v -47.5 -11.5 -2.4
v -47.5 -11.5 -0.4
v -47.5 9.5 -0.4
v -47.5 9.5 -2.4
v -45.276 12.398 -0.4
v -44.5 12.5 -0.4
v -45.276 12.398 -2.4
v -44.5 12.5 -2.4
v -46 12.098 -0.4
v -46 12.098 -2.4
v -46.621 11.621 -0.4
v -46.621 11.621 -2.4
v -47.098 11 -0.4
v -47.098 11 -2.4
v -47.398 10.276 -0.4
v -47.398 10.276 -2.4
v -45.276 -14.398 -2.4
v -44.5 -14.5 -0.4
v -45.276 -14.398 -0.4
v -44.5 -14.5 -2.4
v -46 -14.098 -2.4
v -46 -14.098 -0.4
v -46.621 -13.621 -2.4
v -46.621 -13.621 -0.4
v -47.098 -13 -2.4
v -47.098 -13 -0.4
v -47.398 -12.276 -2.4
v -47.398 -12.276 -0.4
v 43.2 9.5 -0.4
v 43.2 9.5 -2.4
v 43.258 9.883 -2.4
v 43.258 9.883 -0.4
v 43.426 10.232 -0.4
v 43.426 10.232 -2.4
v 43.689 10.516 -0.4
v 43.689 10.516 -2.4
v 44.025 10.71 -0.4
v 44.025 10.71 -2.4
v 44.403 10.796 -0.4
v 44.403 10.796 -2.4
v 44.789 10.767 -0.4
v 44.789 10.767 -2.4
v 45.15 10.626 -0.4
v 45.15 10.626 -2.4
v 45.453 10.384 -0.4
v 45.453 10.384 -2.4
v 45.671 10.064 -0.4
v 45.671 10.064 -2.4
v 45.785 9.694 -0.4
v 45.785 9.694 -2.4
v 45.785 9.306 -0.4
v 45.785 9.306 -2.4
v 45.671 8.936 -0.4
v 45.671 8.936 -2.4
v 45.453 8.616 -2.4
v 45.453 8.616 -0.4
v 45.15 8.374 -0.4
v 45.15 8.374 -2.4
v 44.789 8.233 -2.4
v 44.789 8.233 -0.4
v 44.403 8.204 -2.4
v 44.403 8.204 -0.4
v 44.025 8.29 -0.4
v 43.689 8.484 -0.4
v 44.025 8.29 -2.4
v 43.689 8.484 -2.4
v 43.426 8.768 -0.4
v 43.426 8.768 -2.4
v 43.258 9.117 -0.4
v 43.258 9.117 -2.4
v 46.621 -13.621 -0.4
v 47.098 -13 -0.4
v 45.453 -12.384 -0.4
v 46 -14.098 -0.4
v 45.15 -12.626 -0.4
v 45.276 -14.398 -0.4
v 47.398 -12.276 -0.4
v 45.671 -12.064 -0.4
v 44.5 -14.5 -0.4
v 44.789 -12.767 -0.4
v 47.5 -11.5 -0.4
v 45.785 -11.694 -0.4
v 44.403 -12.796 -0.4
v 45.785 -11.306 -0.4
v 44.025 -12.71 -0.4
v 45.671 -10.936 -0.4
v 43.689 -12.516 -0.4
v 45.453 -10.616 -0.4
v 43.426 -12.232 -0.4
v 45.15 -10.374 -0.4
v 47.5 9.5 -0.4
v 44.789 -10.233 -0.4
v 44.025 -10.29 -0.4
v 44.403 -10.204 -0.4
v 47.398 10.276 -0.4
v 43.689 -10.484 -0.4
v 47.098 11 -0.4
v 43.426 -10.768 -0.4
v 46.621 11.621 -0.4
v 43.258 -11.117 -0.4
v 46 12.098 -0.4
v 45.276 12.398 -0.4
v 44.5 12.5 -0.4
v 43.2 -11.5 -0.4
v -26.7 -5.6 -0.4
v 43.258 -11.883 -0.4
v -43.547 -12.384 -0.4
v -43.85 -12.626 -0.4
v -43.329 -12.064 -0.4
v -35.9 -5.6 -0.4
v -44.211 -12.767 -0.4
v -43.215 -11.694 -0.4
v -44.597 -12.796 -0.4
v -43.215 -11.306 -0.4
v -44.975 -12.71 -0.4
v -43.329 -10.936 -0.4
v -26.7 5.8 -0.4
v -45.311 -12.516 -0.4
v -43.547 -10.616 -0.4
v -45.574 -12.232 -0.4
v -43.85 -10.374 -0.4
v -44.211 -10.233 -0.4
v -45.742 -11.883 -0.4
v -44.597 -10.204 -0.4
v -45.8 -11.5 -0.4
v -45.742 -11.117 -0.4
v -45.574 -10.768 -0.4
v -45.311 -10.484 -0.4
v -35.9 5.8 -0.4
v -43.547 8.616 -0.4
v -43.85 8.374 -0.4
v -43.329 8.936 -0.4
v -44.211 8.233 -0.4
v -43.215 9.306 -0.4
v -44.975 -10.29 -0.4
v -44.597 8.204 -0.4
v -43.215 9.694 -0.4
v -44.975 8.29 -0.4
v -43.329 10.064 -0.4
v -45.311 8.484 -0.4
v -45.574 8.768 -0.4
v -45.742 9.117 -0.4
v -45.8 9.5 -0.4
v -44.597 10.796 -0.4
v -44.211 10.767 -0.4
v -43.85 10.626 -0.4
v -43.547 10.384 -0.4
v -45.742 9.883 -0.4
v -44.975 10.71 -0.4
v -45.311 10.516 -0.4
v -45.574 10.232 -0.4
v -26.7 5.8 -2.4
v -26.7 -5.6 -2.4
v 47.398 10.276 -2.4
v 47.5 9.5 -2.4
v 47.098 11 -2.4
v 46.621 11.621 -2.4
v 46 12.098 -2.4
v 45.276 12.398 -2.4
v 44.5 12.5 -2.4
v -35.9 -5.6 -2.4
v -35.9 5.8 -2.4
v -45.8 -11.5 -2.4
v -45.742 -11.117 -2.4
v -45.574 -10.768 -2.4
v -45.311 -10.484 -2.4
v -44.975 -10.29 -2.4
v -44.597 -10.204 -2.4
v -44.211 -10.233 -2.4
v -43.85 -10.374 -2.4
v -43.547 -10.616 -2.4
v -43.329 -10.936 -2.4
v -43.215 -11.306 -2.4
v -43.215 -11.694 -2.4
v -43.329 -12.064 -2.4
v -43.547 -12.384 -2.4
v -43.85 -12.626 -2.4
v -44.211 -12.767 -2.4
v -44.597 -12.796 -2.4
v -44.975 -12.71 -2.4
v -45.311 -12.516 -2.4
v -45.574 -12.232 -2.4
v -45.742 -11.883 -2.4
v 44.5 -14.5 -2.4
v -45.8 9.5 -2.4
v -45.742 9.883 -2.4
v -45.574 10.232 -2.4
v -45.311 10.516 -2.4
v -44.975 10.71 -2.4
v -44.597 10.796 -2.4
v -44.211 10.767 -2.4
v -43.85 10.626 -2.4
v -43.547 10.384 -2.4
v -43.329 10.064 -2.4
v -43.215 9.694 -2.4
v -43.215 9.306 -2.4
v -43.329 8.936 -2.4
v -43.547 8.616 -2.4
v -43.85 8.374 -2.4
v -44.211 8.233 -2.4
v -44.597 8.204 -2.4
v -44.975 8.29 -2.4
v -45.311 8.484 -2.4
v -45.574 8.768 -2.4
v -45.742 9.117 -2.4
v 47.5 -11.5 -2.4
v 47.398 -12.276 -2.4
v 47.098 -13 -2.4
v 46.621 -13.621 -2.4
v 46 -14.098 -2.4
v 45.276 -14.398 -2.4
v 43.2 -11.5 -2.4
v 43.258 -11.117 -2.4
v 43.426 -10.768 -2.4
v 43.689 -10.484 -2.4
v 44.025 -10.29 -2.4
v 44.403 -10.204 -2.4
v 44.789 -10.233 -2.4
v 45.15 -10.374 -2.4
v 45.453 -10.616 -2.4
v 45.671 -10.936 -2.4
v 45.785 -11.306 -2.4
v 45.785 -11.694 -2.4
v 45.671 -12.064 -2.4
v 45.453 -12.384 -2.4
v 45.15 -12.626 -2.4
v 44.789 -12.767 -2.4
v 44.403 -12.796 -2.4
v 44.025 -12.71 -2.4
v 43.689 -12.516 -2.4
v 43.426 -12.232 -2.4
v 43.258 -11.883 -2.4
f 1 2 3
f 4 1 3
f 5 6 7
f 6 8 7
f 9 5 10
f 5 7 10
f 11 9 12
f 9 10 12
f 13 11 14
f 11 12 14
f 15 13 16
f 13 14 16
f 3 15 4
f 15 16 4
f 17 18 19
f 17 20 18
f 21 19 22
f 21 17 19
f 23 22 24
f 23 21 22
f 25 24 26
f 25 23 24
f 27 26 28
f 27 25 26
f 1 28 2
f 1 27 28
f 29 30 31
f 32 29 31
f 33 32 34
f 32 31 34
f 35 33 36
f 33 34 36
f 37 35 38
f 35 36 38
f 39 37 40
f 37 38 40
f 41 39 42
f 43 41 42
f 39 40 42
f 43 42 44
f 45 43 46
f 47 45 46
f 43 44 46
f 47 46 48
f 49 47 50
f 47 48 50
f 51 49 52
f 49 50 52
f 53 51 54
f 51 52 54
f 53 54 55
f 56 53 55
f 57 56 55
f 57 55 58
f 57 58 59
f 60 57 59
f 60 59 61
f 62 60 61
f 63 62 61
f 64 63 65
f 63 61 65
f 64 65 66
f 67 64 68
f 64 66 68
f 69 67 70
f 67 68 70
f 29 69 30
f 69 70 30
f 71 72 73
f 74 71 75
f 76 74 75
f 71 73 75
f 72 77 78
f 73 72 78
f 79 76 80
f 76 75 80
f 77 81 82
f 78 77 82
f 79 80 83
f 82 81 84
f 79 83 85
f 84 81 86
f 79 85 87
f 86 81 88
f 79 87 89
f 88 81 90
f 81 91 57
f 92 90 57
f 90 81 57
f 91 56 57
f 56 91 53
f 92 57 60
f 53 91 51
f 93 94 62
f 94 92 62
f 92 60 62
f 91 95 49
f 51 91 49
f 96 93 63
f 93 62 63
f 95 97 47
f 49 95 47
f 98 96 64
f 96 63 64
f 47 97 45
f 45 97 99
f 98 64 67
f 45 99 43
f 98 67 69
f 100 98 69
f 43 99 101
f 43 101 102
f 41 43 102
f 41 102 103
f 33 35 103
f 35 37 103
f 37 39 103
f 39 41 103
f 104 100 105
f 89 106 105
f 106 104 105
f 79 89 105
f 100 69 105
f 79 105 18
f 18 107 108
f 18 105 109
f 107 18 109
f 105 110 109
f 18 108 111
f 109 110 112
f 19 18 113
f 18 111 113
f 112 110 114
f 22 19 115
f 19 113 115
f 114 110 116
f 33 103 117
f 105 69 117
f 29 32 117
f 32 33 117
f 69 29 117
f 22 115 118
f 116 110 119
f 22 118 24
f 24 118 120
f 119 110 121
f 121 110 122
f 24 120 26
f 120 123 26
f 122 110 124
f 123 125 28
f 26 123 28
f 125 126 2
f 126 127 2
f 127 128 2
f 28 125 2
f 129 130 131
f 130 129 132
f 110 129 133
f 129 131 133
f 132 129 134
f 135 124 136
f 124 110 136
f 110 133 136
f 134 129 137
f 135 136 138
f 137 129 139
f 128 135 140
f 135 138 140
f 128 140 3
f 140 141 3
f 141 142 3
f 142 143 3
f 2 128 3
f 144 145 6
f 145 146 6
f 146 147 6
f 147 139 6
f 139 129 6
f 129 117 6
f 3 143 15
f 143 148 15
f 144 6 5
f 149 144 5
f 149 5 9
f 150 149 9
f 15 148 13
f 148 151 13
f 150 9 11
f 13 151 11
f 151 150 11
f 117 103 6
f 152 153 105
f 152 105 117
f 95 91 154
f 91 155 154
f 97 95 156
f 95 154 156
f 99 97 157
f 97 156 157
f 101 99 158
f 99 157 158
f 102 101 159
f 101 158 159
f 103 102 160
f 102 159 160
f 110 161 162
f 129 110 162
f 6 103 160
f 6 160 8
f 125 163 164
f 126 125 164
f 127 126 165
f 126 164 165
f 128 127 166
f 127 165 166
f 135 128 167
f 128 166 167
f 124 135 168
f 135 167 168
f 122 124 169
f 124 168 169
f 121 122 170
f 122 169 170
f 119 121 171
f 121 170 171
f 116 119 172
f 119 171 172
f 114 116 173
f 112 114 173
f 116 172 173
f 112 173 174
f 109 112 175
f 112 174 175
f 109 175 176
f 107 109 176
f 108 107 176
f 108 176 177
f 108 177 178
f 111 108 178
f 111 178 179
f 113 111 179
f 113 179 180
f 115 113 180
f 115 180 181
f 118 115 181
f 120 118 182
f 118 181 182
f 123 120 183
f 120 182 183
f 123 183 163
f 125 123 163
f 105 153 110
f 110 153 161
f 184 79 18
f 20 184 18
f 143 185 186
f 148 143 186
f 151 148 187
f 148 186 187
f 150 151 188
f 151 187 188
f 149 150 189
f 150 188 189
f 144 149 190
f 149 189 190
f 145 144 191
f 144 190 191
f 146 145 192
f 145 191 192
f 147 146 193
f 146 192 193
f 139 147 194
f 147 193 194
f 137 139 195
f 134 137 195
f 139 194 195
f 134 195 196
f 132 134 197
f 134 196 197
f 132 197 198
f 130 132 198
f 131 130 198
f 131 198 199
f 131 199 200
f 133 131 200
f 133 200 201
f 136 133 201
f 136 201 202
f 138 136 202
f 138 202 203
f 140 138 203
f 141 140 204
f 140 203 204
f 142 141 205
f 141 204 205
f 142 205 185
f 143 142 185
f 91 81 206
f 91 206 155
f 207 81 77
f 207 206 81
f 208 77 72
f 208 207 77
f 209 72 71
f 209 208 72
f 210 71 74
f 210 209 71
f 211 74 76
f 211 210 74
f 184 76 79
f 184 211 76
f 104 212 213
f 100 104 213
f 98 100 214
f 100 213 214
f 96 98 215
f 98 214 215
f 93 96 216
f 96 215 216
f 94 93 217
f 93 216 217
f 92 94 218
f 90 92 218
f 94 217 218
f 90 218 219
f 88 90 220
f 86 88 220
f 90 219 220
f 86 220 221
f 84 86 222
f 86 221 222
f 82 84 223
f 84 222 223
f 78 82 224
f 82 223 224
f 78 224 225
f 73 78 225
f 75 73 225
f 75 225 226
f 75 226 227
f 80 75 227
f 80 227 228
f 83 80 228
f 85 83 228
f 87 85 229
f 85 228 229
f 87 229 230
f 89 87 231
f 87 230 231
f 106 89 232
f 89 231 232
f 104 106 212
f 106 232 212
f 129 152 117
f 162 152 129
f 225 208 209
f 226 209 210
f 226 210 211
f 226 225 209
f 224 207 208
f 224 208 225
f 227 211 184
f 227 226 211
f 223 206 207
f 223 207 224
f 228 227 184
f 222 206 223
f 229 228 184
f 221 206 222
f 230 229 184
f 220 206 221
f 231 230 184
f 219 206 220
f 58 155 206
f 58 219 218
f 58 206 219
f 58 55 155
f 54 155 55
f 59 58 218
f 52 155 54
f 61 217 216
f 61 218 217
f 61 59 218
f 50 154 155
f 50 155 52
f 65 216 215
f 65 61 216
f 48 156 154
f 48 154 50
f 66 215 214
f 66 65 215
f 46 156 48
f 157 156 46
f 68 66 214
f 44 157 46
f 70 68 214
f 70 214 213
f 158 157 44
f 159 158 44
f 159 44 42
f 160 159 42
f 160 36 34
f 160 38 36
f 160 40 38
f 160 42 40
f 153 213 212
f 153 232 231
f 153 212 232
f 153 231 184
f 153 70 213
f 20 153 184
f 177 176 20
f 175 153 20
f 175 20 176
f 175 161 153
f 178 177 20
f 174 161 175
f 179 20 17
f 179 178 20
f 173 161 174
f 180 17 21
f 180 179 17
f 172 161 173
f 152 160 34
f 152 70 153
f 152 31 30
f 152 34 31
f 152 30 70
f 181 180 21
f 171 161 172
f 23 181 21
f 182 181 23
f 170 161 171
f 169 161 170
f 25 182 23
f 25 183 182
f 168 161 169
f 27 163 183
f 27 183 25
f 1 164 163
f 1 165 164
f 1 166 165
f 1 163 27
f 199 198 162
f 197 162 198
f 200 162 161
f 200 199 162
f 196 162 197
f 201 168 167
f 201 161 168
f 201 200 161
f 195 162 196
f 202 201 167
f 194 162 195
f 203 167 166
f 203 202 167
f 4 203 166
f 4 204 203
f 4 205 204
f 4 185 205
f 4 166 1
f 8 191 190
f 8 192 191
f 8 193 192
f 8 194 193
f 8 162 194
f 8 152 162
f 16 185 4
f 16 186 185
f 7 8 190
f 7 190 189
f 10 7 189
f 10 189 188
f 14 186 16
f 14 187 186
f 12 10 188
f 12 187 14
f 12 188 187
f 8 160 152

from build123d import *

# Parameters (mm, degrees)
SKETCH003_W             = 95
SKETCH003_H             = 27
PAD002_DEPTH            = 2
SKETCH004_R             = 1.3
POCKET001_DEPTH         = 2
FILLET002_R             = 3
SKETCH005_W             = 9.2
SKETCH005_H             = 11.4
POCKET002_DEPTH         = 2
BODY001_PLACEMENT_ANGLE = 180


with BuildPart() as part:
    # Sketch003 → Pad002 (new body)
    with BuildSketch(Plane.XY):
        Rectangle(SKETCH003_W, SKETCH003_H)
    extrude(amount=PAD002_DEPTH)

    # Sketch004 (on Face6 of Pad002) → Pocket001 (cut)
    with BuildSketch(Plane.XY.offset(2)):
        with Locations((-44.5, 10.5)):
            Circle(SKETCH004_R)
        with Locations((44.5, 10.5)):
            Circle(SKETCH004_R)
        with Locations((44.5, -10.5)):
            Circle(SKETCH004_R)
        with Locations((-44.5, -10.5)):
            Circle(SKETCH004_R)
    extrude(amount=-POCKET001_DEPTH, mode=Mode.SUBTRACT)

    # Fillet002
    fillet002_edges = [part.edges().sort_by_distance(p)[0] for p in [
        (-47.5, -13.5, 1),
        (47.5, -13.5, 1),
        (47.5, 13.5, 1),
        (-47.5, 13.5, 1),
    ]]
    fillet(fillet002_edges, radius=FILLET002_R)

    # Sketch005 (on Face5 of Fillet002) → Pocket002 (cut)
    with BuildSketch(Plane.XY.offset(2)):
        with Locations((31.3, 1.1)):
            Rectangle(SKETCH005_W, SKETCH005_H)
    extrude(amount=-POCKET002_DEPTH, mode=Mode.SUBTRACT)


with BuildPart() as part_1:
    # Body001 placement: moved
    add(part.part.moved(Location((0, -1, -0.4))).rotate(Axis((0, -1, -0.4), (0, 1, 0)), BODY001_PLACEMENT_ANGLE))


solid = part_1.part
